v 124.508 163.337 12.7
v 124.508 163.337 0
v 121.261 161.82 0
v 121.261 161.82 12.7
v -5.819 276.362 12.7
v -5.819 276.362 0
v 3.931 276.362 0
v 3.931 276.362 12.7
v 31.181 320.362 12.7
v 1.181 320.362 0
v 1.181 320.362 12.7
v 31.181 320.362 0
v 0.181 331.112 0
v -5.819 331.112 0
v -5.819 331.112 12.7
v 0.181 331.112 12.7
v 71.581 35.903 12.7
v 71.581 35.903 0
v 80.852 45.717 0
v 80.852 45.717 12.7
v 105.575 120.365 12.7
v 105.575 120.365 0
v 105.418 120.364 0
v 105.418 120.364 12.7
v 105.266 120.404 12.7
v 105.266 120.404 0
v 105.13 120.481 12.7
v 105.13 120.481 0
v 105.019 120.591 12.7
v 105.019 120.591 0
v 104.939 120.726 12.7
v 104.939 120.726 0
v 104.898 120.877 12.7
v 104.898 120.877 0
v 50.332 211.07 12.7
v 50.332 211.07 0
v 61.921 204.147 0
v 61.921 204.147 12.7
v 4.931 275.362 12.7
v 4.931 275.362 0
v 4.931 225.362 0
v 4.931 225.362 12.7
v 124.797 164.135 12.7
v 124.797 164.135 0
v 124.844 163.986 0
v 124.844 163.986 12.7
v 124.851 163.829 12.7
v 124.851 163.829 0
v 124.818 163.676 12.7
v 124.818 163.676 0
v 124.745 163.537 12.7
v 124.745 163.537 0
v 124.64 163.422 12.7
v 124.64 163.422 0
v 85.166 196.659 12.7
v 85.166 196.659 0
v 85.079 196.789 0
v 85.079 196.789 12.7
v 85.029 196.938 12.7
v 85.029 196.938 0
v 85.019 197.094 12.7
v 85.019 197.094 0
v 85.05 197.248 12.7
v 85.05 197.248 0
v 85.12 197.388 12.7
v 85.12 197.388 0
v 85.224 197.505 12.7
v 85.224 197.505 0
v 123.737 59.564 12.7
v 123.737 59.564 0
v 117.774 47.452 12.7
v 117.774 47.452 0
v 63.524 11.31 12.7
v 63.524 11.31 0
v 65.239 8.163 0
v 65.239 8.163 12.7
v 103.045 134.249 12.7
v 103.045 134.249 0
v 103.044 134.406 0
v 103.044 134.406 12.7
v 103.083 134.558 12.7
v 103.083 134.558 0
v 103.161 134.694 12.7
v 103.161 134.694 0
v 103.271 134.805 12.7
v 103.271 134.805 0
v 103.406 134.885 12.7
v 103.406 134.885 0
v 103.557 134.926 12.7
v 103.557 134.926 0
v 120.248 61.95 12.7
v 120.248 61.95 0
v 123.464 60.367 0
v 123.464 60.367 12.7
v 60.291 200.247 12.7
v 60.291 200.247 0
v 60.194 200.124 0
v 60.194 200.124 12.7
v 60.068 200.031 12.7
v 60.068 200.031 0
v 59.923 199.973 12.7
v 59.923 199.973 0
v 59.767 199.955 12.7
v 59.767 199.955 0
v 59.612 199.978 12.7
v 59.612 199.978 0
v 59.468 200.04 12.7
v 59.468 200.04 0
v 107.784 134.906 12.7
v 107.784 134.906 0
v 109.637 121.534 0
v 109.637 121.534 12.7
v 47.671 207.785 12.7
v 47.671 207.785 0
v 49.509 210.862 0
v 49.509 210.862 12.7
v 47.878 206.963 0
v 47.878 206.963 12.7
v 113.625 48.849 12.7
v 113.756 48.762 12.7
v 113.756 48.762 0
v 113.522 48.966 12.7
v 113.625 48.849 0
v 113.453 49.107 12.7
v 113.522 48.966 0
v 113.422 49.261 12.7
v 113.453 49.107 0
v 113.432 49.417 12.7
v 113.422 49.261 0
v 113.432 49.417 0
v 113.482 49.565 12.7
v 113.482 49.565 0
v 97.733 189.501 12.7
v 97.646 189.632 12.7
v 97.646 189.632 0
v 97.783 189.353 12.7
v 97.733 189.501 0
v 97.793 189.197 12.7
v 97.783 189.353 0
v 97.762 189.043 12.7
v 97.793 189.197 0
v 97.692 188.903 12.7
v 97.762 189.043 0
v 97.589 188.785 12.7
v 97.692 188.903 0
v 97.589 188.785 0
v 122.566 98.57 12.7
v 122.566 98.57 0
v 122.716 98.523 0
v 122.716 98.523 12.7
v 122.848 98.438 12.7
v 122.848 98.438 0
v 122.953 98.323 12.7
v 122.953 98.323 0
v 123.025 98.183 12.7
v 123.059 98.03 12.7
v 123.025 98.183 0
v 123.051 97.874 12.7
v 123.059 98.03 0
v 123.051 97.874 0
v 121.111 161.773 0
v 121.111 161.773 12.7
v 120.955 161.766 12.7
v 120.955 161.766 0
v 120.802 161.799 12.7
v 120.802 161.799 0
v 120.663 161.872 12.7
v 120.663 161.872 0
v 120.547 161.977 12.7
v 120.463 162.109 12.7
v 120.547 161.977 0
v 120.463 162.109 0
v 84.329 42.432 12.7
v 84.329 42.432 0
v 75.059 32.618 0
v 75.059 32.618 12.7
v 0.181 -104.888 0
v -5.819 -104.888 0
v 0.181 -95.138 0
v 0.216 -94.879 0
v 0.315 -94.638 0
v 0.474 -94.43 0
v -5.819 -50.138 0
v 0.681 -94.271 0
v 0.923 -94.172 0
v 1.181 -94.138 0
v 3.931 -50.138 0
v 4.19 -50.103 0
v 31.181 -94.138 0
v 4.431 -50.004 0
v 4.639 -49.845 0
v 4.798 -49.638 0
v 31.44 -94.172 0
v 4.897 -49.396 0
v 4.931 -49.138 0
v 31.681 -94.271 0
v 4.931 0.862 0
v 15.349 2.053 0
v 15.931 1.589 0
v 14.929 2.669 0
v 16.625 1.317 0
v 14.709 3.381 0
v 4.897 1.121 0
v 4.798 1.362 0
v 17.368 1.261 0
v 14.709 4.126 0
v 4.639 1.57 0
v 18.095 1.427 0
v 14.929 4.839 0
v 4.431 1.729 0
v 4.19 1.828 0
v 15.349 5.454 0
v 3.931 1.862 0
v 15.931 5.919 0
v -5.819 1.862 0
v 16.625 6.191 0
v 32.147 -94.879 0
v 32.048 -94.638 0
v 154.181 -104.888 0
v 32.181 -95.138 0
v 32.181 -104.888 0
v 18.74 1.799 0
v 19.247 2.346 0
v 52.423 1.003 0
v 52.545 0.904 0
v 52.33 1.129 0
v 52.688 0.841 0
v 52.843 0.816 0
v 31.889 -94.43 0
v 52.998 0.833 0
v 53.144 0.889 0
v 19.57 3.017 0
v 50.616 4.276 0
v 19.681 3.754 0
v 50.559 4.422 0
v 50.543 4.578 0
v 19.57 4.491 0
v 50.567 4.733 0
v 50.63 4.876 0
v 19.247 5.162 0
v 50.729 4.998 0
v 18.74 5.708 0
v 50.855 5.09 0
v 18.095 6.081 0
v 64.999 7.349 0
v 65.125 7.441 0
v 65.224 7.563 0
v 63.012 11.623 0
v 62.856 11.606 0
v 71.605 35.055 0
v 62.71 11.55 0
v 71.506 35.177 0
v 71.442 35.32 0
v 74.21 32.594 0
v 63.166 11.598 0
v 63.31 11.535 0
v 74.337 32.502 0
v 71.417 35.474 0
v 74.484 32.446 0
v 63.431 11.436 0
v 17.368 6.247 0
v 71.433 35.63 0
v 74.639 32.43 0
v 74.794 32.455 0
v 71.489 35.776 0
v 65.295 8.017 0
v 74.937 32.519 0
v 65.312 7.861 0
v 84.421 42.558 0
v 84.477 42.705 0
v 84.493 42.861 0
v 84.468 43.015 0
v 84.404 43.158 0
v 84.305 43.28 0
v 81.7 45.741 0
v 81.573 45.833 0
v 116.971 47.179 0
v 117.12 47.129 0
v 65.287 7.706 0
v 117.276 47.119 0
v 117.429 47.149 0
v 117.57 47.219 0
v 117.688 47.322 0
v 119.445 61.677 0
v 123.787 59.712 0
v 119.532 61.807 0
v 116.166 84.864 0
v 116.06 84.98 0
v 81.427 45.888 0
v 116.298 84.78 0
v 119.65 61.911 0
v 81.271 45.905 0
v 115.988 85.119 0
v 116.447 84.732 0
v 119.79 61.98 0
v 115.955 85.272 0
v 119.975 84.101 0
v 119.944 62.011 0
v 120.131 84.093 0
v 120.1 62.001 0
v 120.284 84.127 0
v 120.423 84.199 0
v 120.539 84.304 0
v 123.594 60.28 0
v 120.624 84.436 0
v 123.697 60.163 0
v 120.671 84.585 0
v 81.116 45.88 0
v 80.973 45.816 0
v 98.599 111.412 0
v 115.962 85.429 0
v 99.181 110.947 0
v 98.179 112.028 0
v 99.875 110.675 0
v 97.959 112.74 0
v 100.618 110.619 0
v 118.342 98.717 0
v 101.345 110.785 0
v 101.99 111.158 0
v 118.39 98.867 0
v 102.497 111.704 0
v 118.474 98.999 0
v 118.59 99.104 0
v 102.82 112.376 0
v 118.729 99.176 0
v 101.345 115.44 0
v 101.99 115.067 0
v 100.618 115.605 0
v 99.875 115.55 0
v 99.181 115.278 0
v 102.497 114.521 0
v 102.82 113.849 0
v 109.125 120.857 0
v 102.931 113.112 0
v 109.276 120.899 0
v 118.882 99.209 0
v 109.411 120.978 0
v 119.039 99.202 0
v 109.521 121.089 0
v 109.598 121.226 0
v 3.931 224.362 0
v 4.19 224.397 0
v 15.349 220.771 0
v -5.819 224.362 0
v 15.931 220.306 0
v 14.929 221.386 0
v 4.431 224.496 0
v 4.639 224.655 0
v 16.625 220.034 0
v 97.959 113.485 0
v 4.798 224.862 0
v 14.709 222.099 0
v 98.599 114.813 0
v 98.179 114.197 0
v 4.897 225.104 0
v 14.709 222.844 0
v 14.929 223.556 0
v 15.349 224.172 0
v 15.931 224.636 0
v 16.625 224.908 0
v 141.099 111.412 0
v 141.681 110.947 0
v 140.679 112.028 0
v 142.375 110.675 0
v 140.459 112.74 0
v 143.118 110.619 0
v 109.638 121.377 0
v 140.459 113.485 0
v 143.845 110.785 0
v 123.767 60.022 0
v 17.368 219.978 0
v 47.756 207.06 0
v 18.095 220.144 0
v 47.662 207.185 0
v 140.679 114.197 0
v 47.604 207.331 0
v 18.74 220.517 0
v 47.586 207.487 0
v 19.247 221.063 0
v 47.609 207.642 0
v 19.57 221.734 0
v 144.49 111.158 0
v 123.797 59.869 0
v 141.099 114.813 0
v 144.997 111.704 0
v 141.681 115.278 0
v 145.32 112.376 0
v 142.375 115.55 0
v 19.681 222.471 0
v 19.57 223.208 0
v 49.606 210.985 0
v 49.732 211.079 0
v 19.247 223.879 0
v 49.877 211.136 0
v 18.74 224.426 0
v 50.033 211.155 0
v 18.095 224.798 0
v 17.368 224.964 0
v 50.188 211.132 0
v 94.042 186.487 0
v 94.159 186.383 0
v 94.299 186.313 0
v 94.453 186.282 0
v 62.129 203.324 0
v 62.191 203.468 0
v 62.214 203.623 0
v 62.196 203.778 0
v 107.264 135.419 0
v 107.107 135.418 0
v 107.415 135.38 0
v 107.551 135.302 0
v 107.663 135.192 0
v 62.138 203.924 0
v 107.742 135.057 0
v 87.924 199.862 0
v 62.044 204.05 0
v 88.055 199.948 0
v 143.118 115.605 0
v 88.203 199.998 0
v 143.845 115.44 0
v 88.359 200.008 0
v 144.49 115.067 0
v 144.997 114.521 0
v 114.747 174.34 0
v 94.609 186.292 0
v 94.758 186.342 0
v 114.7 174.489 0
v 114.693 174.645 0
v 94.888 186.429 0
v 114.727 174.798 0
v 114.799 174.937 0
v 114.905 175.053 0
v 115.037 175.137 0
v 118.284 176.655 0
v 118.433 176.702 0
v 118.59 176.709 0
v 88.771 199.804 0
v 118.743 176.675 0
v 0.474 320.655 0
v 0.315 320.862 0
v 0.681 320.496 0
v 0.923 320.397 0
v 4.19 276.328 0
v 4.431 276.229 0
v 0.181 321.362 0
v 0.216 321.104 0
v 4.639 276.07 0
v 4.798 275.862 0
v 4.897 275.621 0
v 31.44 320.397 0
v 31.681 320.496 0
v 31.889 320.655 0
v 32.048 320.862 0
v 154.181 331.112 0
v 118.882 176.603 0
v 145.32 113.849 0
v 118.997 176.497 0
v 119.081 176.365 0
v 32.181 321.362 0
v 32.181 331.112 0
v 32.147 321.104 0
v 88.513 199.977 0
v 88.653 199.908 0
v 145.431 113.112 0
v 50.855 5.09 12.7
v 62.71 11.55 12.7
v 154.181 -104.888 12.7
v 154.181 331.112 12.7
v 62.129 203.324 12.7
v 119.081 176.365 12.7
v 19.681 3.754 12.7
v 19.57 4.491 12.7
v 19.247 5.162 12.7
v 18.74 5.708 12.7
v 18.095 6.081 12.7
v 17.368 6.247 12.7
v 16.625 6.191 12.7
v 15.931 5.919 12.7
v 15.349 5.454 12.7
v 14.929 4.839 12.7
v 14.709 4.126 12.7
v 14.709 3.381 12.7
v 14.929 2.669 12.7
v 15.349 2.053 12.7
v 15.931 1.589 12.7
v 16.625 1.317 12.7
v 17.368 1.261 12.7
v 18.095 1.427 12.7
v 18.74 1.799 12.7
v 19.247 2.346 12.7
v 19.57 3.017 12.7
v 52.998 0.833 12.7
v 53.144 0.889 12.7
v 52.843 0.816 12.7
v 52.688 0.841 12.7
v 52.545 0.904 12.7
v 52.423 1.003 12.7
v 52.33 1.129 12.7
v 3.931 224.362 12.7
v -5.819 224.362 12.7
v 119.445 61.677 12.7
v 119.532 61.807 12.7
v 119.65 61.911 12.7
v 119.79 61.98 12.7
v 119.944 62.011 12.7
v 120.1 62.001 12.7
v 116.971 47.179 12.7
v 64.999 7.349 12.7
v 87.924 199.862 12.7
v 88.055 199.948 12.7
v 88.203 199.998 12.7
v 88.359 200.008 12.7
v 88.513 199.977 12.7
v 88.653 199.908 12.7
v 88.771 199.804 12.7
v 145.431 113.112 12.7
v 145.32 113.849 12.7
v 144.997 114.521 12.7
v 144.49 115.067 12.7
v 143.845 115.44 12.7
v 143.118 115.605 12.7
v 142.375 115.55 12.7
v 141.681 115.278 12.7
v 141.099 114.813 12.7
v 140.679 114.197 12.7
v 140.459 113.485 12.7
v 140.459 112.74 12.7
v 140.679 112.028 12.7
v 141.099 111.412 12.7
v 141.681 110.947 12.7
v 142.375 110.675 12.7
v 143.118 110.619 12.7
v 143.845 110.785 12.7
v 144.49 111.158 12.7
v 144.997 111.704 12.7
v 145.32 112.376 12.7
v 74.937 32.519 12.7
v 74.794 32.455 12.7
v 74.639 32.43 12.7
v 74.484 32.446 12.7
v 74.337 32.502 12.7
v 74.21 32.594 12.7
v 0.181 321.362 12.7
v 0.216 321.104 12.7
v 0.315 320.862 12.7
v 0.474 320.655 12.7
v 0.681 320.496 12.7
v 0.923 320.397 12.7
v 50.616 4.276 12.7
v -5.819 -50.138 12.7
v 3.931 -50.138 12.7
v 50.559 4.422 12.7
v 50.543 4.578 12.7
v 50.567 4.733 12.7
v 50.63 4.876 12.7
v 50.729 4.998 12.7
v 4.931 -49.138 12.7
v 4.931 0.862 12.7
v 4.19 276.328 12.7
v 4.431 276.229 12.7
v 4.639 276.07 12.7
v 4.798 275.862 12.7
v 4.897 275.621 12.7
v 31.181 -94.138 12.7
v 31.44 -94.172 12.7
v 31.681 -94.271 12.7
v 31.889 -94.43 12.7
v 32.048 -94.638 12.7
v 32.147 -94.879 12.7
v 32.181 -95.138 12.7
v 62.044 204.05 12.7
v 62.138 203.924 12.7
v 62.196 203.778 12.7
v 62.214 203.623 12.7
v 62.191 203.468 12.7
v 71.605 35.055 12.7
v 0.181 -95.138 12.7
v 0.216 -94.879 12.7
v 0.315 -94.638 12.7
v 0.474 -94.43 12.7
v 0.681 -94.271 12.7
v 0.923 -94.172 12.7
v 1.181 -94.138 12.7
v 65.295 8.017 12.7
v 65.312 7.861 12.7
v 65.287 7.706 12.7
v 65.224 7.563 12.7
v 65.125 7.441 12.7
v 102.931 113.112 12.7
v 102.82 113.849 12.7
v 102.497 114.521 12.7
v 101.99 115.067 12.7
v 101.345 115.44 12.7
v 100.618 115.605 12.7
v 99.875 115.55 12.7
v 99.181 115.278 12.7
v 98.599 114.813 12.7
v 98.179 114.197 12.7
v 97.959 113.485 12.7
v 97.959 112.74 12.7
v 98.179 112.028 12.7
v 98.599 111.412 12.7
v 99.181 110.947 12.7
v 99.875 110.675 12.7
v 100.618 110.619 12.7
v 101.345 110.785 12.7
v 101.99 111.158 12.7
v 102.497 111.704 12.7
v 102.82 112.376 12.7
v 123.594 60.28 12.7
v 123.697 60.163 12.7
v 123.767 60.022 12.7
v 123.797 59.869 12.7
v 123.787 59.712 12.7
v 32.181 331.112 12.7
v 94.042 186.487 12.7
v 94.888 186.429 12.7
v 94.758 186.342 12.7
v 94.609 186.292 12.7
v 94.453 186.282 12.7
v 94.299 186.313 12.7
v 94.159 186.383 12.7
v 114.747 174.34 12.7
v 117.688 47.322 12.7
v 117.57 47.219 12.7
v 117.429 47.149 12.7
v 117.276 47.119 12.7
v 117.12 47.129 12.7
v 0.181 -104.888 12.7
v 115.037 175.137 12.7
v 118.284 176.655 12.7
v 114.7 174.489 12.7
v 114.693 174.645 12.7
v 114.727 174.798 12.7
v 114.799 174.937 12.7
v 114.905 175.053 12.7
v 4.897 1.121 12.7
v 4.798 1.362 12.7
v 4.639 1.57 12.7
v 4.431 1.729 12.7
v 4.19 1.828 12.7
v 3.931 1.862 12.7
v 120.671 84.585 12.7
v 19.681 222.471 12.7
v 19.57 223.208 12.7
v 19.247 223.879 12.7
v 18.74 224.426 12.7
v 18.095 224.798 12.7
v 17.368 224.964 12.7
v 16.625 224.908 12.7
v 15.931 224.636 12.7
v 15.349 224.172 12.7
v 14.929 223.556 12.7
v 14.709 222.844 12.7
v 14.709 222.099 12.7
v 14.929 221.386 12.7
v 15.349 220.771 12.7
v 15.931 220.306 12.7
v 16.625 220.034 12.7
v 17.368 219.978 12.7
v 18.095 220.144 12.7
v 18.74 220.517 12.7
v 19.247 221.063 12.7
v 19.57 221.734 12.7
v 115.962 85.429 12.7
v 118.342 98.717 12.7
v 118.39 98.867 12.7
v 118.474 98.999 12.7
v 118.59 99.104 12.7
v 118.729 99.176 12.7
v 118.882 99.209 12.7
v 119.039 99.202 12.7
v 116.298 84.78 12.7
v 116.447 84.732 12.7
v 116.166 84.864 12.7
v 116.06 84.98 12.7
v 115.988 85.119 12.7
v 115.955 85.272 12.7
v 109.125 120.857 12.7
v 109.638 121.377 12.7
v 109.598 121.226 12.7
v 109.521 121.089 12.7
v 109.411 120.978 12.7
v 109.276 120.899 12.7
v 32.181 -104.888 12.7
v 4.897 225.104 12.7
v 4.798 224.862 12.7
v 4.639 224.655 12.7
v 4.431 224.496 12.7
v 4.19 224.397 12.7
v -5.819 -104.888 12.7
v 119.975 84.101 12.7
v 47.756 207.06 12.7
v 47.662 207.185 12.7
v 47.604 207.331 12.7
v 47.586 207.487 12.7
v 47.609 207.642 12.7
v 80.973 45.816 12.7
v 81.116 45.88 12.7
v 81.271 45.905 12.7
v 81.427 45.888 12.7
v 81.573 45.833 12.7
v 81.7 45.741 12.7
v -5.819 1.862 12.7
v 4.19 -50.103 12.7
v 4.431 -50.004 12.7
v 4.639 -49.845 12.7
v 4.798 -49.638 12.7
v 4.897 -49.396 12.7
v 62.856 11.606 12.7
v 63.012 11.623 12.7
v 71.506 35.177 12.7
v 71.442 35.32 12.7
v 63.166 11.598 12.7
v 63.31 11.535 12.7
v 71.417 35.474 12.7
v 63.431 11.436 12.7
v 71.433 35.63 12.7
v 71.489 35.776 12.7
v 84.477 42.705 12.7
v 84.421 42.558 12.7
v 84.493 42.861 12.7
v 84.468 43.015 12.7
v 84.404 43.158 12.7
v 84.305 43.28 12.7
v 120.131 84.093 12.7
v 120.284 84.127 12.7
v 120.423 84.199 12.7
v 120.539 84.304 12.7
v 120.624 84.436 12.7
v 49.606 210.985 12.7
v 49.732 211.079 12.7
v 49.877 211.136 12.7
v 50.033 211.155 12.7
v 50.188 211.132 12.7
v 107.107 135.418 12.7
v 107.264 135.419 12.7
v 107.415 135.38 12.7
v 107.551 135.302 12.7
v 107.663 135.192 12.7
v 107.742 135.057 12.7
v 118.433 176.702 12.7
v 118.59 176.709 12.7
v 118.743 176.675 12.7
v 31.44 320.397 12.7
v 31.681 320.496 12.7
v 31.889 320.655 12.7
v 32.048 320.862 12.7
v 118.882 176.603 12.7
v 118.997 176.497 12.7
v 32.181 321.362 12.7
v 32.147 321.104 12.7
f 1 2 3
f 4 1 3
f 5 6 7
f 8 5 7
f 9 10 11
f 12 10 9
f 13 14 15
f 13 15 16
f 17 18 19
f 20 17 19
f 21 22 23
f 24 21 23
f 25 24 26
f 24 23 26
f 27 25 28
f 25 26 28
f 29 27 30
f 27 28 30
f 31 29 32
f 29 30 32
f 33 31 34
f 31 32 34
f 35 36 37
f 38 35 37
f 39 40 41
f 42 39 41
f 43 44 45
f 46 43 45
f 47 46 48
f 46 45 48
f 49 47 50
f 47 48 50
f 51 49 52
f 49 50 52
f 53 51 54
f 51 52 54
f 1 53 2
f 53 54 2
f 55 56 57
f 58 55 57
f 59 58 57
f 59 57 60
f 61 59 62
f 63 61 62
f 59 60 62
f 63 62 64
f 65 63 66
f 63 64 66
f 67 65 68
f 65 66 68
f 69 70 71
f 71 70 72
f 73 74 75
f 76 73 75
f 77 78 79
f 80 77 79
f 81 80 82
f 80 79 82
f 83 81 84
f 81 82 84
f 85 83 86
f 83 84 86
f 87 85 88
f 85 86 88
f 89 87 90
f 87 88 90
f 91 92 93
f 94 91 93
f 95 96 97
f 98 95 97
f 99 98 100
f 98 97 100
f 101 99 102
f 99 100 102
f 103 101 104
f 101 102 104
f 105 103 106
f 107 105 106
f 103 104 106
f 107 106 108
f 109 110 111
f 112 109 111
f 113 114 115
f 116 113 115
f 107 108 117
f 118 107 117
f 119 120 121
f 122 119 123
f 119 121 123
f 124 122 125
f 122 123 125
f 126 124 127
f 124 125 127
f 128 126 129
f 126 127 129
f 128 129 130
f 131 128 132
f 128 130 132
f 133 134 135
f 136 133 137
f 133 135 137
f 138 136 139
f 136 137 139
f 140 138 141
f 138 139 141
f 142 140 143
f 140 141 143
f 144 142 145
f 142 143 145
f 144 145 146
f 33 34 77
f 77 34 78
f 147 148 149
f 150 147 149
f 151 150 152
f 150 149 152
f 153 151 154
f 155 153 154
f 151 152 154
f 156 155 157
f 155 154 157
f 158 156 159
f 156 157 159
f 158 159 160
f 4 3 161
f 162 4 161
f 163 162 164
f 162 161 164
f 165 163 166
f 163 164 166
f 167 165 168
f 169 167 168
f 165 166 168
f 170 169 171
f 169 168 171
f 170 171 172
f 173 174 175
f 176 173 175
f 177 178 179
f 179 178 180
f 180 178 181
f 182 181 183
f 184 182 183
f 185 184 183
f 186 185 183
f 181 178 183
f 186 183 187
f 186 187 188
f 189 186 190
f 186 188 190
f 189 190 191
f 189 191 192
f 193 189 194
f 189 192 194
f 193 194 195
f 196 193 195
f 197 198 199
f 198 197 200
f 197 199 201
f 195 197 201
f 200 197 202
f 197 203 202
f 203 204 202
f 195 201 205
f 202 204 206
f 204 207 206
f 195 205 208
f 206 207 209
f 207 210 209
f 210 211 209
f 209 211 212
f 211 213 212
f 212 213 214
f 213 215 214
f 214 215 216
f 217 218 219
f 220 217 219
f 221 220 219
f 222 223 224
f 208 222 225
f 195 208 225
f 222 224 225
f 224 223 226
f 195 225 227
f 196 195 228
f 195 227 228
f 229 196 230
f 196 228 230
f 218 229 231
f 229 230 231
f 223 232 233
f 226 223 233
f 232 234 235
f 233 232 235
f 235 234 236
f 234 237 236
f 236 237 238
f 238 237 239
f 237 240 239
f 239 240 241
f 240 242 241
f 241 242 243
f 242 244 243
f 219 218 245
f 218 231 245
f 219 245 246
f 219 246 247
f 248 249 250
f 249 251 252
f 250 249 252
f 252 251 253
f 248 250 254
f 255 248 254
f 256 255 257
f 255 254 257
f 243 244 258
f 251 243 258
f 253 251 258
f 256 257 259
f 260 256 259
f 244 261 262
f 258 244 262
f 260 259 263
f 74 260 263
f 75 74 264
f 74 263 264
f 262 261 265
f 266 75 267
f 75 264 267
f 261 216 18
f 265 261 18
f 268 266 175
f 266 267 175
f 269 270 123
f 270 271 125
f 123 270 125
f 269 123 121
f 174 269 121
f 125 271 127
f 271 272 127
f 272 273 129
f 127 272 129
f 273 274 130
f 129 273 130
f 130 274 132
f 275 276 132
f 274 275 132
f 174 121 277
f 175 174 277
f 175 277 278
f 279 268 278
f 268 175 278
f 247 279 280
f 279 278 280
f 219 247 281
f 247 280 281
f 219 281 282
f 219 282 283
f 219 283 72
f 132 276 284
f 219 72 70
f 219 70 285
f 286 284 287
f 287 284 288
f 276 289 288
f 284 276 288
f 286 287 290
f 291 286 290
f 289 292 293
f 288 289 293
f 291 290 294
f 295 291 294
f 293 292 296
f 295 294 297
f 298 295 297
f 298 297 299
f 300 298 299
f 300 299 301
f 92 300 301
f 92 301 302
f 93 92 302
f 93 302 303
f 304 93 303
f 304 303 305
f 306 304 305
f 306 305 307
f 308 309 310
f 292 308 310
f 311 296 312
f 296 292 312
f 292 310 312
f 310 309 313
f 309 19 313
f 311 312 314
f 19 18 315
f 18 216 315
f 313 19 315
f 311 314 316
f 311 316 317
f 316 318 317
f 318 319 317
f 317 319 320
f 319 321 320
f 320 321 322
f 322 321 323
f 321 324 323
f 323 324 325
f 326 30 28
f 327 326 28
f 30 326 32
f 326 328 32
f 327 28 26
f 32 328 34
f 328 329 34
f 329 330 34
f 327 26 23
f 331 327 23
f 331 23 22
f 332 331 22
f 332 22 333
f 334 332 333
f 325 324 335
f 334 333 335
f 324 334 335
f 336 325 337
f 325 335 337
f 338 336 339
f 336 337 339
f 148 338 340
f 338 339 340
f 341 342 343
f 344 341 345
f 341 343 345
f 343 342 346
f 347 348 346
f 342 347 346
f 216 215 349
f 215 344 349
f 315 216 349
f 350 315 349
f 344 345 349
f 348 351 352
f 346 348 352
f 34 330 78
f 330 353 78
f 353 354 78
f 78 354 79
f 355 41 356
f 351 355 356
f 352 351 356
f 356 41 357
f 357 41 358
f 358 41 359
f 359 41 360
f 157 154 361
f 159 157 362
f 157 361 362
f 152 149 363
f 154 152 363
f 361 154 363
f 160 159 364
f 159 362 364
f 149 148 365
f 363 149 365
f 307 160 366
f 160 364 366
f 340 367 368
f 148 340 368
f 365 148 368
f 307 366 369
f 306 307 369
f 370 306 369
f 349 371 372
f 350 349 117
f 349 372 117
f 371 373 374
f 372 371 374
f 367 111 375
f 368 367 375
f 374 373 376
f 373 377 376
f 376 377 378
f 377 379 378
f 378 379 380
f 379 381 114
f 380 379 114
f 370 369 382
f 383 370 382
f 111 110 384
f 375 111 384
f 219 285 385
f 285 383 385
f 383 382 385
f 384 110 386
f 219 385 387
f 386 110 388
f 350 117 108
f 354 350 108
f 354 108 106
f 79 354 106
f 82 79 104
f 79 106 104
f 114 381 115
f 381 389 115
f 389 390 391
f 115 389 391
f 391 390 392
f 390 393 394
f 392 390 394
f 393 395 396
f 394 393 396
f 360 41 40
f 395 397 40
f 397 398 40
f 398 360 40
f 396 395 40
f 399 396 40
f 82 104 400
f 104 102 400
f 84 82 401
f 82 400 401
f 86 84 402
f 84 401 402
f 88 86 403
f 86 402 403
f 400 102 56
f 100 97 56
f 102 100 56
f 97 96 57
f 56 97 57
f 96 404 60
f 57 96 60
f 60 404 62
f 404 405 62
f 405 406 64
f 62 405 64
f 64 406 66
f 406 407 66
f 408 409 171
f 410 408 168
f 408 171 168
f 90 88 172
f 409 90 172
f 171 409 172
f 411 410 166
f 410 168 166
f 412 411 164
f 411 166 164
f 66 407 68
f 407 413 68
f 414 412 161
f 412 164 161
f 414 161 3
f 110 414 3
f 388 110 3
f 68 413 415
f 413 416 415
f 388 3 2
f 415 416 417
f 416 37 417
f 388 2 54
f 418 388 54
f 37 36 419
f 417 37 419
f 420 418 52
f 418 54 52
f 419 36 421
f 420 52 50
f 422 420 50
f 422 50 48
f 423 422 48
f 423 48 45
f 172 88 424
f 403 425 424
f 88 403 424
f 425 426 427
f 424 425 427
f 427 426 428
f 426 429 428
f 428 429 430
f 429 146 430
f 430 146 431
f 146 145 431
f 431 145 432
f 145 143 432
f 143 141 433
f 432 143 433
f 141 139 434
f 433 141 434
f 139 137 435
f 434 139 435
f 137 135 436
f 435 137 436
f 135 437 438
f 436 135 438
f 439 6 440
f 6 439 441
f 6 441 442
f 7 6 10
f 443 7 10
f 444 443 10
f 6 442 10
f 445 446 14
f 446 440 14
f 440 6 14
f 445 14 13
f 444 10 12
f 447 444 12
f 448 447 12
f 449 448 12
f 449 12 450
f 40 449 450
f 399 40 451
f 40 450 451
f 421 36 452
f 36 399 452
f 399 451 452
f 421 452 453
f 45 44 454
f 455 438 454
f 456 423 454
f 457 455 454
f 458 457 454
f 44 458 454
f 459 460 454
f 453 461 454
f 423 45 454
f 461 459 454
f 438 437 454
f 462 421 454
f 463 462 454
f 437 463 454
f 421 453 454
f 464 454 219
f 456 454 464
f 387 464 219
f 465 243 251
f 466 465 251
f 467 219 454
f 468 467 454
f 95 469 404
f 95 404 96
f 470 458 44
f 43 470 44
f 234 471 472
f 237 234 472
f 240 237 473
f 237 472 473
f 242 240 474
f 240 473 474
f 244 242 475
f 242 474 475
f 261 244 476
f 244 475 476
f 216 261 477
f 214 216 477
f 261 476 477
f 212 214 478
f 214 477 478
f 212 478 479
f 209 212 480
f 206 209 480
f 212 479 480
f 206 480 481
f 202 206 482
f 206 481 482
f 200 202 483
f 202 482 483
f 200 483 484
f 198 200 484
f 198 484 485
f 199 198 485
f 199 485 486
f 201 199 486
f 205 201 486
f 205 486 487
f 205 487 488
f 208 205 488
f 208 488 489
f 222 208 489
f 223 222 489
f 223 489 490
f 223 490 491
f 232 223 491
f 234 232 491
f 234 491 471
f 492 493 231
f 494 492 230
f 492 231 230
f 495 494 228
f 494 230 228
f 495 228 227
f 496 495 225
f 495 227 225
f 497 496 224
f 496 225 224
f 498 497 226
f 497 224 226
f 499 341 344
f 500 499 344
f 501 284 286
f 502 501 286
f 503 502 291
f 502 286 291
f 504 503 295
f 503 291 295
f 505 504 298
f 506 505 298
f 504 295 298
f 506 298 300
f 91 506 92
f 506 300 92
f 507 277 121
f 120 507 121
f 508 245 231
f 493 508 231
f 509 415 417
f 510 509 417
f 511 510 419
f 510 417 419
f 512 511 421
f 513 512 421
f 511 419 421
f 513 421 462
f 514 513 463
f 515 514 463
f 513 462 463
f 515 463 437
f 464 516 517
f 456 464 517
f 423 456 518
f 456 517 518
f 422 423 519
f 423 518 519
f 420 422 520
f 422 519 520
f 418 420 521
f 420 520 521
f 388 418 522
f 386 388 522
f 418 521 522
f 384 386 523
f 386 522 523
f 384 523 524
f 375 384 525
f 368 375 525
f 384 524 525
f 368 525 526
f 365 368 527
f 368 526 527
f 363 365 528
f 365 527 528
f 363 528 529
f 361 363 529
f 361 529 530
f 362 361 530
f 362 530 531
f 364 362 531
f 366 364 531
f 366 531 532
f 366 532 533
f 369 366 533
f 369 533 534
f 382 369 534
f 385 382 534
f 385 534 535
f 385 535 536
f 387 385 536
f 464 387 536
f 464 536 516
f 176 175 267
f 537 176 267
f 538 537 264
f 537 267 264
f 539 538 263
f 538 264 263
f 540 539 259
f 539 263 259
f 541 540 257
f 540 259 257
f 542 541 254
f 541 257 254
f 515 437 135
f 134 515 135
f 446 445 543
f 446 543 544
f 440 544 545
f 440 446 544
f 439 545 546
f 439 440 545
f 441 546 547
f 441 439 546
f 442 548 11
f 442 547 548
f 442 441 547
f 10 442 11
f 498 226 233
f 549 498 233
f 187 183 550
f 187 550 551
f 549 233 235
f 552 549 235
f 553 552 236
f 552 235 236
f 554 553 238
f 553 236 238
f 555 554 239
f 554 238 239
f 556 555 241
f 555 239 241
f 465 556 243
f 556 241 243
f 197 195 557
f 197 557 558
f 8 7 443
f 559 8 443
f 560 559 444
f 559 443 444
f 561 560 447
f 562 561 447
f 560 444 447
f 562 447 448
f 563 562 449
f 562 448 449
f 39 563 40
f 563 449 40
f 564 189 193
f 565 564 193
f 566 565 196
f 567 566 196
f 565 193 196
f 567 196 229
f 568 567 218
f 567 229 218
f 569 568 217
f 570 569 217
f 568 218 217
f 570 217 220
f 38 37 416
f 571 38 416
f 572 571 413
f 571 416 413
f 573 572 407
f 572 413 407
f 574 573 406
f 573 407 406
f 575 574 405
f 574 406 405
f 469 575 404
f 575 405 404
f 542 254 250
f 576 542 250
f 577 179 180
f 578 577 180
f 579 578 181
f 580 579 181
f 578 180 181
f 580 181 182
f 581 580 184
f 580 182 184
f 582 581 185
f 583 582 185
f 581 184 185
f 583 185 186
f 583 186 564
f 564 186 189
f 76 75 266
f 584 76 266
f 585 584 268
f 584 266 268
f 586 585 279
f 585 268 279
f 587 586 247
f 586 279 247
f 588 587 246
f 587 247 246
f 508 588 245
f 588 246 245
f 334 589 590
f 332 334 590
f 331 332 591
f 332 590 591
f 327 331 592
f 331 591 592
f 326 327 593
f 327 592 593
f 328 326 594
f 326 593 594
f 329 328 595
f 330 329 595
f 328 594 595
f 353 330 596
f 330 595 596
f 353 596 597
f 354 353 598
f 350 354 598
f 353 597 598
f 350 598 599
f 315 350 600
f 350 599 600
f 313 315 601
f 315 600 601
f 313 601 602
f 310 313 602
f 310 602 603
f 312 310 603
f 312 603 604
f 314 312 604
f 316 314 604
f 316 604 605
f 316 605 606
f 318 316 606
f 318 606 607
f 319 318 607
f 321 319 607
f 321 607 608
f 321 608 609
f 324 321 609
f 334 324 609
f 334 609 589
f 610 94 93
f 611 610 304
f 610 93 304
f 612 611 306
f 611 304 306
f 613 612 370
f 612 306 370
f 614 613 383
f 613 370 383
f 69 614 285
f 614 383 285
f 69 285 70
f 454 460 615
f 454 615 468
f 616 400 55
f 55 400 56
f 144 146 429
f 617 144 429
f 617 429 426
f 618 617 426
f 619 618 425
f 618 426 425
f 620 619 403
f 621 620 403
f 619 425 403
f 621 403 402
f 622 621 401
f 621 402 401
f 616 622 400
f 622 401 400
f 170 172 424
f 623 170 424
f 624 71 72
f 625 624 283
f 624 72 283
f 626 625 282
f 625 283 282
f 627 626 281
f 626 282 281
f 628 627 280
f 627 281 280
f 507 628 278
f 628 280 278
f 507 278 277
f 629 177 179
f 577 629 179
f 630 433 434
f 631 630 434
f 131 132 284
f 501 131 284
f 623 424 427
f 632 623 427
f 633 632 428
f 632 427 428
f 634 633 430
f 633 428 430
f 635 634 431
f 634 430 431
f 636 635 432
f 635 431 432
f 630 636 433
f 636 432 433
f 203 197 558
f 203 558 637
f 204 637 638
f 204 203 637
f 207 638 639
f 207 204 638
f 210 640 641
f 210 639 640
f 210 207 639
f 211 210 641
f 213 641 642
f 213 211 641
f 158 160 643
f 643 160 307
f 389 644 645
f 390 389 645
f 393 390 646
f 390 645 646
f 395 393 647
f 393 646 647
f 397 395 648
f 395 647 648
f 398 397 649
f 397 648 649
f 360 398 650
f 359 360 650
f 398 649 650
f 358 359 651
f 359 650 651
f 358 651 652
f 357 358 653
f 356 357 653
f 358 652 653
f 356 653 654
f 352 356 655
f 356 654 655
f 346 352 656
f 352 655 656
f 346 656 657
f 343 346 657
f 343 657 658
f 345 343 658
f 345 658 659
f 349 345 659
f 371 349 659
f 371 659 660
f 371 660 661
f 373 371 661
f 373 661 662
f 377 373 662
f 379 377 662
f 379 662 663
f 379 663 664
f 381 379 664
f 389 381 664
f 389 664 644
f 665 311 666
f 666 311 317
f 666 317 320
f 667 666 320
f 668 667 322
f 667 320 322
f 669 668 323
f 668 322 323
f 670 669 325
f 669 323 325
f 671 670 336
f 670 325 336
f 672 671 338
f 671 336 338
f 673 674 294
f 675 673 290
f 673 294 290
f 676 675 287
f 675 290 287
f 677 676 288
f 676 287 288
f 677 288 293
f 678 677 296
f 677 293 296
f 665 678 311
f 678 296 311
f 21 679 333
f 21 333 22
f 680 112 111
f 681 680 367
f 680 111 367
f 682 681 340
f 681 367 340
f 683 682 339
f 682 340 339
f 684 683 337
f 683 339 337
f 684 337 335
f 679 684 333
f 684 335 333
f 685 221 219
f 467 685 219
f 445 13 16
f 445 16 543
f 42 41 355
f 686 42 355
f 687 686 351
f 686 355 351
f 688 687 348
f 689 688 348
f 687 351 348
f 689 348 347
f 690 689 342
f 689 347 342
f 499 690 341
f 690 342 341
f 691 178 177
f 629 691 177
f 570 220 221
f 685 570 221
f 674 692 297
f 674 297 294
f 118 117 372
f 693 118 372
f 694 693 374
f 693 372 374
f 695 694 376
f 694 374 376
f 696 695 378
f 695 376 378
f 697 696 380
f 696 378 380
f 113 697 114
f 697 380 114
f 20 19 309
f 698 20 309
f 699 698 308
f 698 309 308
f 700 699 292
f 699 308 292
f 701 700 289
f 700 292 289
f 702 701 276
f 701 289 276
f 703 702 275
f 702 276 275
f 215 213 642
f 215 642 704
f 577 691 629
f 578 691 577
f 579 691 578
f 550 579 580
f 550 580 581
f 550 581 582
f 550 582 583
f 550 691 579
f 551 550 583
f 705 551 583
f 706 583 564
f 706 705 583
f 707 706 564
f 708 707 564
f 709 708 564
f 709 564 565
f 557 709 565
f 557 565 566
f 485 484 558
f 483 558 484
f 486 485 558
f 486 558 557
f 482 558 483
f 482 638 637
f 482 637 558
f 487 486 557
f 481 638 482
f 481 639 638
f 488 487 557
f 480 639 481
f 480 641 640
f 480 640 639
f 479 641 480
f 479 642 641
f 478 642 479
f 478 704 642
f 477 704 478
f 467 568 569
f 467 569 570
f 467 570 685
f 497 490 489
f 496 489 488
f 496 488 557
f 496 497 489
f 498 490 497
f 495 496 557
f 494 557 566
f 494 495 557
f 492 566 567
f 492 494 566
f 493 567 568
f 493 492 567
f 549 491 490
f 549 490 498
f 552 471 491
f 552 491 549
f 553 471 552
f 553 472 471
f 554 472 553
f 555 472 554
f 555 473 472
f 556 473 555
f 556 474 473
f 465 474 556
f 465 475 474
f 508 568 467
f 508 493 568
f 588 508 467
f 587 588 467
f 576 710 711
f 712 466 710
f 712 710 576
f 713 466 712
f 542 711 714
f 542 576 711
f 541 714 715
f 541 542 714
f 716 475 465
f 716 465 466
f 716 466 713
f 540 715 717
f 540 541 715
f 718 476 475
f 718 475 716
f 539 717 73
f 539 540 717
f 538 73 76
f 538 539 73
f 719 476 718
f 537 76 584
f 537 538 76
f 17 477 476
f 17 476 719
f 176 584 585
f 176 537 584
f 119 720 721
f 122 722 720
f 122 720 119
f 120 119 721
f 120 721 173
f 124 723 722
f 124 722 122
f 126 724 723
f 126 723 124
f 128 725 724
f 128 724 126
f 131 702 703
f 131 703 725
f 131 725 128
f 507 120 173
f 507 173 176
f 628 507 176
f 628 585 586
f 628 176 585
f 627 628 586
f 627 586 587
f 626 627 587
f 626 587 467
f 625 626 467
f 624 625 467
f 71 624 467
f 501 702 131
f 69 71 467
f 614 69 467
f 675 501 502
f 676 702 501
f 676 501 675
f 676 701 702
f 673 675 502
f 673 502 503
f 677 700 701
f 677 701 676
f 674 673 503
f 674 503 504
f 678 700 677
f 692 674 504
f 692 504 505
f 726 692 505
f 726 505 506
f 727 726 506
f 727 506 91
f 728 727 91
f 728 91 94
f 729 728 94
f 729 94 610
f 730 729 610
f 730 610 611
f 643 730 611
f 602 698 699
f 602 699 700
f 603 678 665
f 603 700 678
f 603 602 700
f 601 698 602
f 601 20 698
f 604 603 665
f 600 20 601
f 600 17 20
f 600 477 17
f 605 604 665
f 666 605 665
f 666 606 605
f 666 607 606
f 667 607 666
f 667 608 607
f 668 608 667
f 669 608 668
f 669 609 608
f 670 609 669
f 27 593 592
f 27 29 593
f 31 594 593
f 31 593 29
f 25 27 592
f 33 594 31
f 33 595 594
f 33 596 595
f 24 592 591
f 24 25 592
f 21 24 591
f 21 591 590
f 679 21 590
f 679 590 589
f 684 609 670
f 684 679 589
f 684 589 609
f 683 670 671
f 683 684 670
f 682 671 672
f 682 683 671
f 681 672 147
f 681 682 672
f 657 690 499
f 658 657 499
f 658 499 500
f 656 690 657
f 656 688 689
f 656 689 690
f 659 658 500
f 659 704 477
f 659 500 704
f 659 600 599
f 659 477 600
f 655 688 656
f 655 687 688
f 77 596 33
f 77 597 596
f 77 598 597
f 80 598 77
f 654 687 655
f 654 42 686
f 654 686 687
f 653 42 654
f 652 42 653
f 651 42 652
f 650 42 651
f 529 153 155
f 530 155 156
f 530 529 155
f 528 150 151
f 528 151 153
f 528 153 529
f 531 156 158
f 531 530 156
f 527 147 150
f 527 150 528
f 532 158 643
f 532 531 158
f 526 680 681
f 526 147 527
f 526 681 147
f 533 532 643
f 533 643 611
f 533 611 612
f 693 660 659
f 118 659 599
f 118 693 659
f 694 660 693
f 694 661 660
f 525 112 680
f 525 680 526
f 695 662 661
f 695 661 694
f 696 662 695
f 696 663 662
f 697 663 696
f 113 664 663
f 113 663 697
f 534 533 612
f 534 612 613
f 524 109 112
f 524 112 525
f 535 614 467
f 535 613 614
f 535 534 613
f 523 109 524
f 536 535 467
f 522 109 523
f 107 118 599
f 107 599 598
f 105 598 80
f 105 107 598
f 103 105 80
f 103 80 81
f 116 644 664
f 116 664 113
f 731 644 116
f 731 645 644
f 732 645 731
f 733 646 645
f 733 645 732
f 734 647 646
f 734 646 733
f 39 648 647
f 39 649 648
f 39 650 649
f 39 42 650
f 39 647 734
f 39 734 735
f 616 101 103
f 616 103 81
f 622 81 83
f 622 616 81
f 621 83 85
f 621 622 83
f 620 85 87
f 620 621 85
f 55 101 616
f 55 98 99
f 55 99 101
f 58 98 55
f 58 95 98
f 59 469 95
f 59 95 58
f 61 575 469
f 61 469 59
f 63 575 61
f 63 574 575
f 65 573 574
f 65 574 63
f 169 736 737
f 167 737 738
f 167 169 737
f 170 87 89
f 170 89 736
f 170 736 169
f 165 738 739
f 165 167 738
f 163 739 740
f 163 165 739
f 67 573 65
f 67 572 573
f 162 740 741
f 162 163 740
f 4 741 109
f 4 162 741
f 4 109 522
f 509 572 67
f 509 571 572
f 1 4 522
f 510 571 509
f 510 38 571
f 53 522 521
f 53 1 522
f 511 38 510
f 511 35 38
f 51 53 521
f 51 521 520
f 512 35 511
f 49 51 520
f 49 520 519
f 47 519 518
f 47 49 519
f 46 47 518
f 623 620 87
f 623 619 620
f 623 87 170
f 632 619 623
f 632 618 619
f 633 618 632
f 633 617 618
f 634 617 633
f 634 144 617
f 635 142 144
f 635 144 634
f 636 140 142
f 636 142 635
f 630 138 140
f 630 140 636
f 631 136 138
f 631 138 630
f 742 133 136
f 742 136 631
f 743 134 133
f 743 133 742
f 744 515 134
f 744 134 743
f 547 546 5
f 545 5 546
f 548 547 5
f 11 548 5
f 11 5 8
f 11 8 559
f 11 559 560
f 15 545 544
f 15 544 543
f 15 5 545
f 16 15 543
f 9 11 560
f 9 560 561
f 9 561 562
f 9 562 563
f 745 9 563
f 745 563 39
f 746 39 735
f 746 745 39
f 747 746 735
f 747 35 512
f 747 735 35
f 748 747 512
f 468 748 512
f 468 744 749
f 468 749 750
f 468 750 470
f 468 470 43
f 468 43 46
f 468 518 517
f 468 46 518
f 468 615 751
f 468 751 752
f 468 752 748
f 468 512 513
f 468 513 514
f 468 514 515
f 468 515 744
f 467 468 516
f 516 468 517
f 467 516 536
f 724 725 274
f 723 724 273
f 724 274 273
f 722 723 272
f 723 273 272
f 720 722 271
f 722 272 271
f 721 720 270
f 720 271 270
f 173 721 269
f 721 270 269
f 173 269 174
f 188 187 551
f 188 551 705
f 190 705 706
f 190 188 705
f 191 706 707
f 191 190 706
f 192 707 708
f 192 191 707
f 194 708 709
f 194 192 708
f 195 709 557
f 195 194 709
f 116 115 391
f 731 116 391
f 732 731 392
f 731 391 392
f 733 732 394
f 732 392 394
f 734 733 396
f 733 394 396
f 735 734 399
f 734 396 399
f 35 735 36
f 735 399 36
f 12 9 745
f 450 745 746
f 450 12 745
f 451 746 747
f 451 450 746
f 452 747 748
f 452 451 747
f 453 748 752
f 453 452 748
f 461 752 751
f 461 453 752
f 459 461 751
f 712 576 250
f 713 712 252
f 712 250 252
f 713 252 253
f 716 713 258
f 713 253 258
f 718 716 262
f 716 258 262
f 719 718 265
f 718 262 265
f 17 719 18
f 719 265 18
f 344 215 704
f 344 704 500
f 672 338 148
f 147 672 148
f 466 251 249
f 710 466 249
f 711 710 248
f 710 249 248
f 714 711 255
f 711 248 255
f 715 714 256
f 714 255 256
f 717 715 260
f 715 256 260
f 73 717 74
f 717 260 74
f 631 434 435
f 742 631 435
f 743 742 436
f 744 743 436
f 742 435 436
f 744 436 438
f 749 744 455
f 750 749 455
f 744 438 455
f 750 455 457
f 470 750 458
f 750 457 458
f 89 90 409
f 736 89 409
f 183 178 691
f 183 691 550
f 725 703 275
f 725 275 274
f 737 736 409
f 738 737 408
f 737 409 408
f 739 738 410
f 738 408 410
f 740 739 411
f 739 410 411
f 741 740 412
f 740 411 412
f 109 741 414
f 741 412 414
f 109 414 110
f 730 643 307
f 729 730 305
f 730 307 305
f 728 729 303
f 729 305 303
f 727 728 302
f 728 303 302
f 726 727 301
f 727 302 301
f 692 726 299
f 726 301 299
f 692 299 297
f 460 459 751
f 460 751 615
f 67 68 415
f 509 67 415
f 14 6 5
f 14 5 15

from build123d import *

# Parameters (mm, degrees)
SKETCH1_W                = 160
SKETCH1_H                = 436
BOSS_EXTRUDE1_DEPTH      = 12.7
CUT_EXTRUDE1_DEPTH       = 366.47051465
CIRPATTERN1_COUNT        = 3
CIRPATTERN1_ANGLE        = 102.52
CUT_EXTRUDE2_DEPTH       = 366.47051465
CIRPATTERN2_COUNT        = 2
CIRPATTERN2_ANGLE        = 51.26
F_5_0_5_DIAMETER_HOLE1_D = 5
CUT_EXTRUDE3_DEPTH       = 366.47051465


with BuildPart() as part:
    # Sketch1 → Boss-Extrude1 (new body)
    with BuildSketch(Plane.XY):
        with Locations((74.181489842, 113.112481294)):
            Rectangle(SKETCH1_W, SKETCH1_H)
    extrude(amount=BOSS_EXTRUDE1_DEPTH)

    # Sketch3 → Cut-Extrude1 (cut, through all)
    with BuildSketch(Plane(origin=(0, 0, 0), x_dir=(-1, 0, 0), z_dir=(0, 0, -1))):
        with BuildLine():
            Line((-59.468207995, 200.039680409), (-47.878421887, 206.962603057))
            ThreePointArc((-47.878421887, 206.962603057), (-47.604309032, 207.331039293), (-47.671005734, 207.785390113))
            Line((-47.671005734, 207.785390113), (-49.508913494, 210.862263699))
            ThreePointArc((-49.508913494, 210.862263699), (-49.87734973, 211.136376554), (-50.33170055, 211.069679852))
            Line((-50.33170055, 211.069679852), (-61.921486657, 204.146757205))
            ThreePointArc((-61.921486657, 204.146757205), (-62.195599513, 203.778320969), (-62.128902811, 203.323970149))
            Line((-62.128902811, 203.323970149), (-60.29099505, 200.247096563))
            ThreePointArc((-60.29099505, 200.247096563), (-59.922558815, 199.972983708), (-59.468207995, 200.039680409))
        make_face()
        with BuildLine():
            Line((-94.041533827, 186.486629291), (-85.165935337, 196.658834137))
            ThreePointArc((-85.165935337, 196.658834137), (-85.019418624, 197.094053588), (-85.223562287, 197.505403175))
            Line((-85.223562287, 197.505403175), (-87.924094299, 199.861710211))
            ThreePointArc((-87.924094299, 199.861710211), (-88.35931375, 200.008226924), (-88.770663336, 199.804083262))
            Line((-88.770663336, 199.804083262), (-97.646261826, 189.631878415))
            ThreePointArc((-97.646261826, 189.631878415), (-97.79277854, 189.196658964), (-97.588634877, 188.785309377))
            Line((-97.588634877, 188.785309377), (-94.888102864, 186.429002341))
            ThreePointArc((-94.888102864, 186.429002341), (-94.452883414, 186.282485628), (-94.041533827, 186.486629291))
        make_face()
    cut_extrude1 = extrude(amount=-CUT_EXTRUDE1_DEPTH, mode=Mode.SUBTRACT)

    # CirPattern1: Cut-Extrude1 ×3 about axis
    cirpattern1_axis = Axis((-0.318510158, 113.112481294, 0), (0, 0, -1))
    for i in range(1, CIRPATTERN1_COUNT):
        add(cut_extrude1.rotate(cirpattern1_axis, i * CIRPATTERN1_ANGLE / (CIRPATTERN1_COUNT - 1)), mode=Mode.SUBTRACT)

    # Sketch4 → Cut-Extrude2 (cut, through all)
    with BuildSketch(Plane(origin=(0, 0, 0), x_dir=(-1, 0, 0), z_dir=(0, 0, -1))):
        with BuildLine():
            Line((-124.50767277, 163.337281817), (-121.260766753, 161.81983089))
            ThreePointArc((-121.260766753, 161.81983089), (-120.80200107, 161.799406266), (-120.463162354, 162.109360202))
            Line((-120.463162354, 162.109360202), (-114.747317623, 174.339614451))
            ThreePointArc((-114.747317623, 174.339614451), (-114.726892999, 174.798380135), (-115.036846934, 175.13721885))
            Line((-115.036846934, 175.13721885), (-118.283752952, 176.654669778))
            ThreePointArc((-118.283752952, 176.654669778), (-118.742518635, 176.675094401), (-119.081357351, 176.365140466))
            Line((-119.081357351, 176.365140466), (-124.797202082, 164.134886216))
            ThreePointArc((-124.797202082, 164.134886216), (-124.817626706, 163.676120533), (-124.50767277, 163.337281817))
        make_face()
    cut_extrude2 = extrude(amount=-CUT_EXTRUDE2_DEPTH, mode=Mode.SUBTRACT)

    # CirPattern2: Cut-Extrude2 ×2 about axis
    cirpattern2_axis = Axis((-0.318510158, 113.112481294, 0), (0, 0, -1))
    for i in range(1, CIRPATTERN2_COUNT):
        add(cut_extrude2.rotate(cirpattern2_axis, i * CIRPATTERN2_ANGLE / (CIRPATTERN2_COUNT - 1)), mode=Mode.SUBTRACT)

    # Ø5.0 (5) Diameter Hole1 (through all)
    with Locations(Plane(origin=(0, 0, 0), x_dir=(-1, 0, 0), z_dir=(0, 0, -1))):
        with Locations((-142.931489842, 113.112481294)):
            f_5_0_5_diameter_hole1 = Hole(F_5_0_5_DIAMETER_HOLE1_D / 2)

    # Sketch-Pattern9: Ø5.0 (5) Diameter Hole1 at 3 more places
    with Locations((-42.5, 0, 0), (-125.75, 109.358642, 0), (-125.75, -109.358642, 0)):
        add(f_5_0_5_diameter_hole1, mode=Mode.SUBTRACT)

    # Sketch9 → Cut-Extrude3 (cut, through all)
    with BuildSketch(Plane(origin=(0, 0, 0), x_dir=(-1, 0, 0), z_dir=(0, 0, -1))):
        with BuildLine():
            Line((5.818510158, 276.362481294), (-3.931489842, 276.362481294))
            ThreePointArc((-3.931489842, 276.362481294), (-4.638596623, 276.069588075), (-4.931489842, 275.362481294))
            Line((-4.931489842, 275.362481294), (-4.931489842, 225.362481294))
            ThreePointArc((-4.931489842, 225.362481294), (-4.638596623, 224.655374512), (-3.931489842, 224.362481294))
            Line((-3.931489842, 224.362481294), (5.818510158, 224.362481294))
            Line((5.818510158, 224.362481294), (5.818510158, 276.362481294))
        make_face()
        with BuildLine():
            Line((-32.181489842, 331.112481294), (-0.181489842, 331.112481294))
            Line((-0.181489842, 331.112481294), (-0.181489842, 321.362481294))
            ThreePointArc((-0.181489842, 321.362481294), (-0.474383061, 320.655374512), (-1.181489842, 320.362481294))
            Line((-1.181489842, 320.362481294), (-31.181489842, 320.362481294))
            ThreePointArc((-31.181489842, 320.362481294), (-31.888596623, 320.655374512), (-32.181489842, 321.362481294))
            Line((-32.181489842, 321.362481294), (-32.181489842, 331.112481294))
        make_face()
    cut_extrude3 = extrude(amount=-CUT_EXTRUDE3_DEPTH, mode=Mode.SUBTRACT)

    # Mirror1: Cut-Extrude3 across plane
    add(cut_extrude3.mirror(Plane.ZX.offset(113.112481294)), mode=Mode.SUBTRACT)


solid = part.part
